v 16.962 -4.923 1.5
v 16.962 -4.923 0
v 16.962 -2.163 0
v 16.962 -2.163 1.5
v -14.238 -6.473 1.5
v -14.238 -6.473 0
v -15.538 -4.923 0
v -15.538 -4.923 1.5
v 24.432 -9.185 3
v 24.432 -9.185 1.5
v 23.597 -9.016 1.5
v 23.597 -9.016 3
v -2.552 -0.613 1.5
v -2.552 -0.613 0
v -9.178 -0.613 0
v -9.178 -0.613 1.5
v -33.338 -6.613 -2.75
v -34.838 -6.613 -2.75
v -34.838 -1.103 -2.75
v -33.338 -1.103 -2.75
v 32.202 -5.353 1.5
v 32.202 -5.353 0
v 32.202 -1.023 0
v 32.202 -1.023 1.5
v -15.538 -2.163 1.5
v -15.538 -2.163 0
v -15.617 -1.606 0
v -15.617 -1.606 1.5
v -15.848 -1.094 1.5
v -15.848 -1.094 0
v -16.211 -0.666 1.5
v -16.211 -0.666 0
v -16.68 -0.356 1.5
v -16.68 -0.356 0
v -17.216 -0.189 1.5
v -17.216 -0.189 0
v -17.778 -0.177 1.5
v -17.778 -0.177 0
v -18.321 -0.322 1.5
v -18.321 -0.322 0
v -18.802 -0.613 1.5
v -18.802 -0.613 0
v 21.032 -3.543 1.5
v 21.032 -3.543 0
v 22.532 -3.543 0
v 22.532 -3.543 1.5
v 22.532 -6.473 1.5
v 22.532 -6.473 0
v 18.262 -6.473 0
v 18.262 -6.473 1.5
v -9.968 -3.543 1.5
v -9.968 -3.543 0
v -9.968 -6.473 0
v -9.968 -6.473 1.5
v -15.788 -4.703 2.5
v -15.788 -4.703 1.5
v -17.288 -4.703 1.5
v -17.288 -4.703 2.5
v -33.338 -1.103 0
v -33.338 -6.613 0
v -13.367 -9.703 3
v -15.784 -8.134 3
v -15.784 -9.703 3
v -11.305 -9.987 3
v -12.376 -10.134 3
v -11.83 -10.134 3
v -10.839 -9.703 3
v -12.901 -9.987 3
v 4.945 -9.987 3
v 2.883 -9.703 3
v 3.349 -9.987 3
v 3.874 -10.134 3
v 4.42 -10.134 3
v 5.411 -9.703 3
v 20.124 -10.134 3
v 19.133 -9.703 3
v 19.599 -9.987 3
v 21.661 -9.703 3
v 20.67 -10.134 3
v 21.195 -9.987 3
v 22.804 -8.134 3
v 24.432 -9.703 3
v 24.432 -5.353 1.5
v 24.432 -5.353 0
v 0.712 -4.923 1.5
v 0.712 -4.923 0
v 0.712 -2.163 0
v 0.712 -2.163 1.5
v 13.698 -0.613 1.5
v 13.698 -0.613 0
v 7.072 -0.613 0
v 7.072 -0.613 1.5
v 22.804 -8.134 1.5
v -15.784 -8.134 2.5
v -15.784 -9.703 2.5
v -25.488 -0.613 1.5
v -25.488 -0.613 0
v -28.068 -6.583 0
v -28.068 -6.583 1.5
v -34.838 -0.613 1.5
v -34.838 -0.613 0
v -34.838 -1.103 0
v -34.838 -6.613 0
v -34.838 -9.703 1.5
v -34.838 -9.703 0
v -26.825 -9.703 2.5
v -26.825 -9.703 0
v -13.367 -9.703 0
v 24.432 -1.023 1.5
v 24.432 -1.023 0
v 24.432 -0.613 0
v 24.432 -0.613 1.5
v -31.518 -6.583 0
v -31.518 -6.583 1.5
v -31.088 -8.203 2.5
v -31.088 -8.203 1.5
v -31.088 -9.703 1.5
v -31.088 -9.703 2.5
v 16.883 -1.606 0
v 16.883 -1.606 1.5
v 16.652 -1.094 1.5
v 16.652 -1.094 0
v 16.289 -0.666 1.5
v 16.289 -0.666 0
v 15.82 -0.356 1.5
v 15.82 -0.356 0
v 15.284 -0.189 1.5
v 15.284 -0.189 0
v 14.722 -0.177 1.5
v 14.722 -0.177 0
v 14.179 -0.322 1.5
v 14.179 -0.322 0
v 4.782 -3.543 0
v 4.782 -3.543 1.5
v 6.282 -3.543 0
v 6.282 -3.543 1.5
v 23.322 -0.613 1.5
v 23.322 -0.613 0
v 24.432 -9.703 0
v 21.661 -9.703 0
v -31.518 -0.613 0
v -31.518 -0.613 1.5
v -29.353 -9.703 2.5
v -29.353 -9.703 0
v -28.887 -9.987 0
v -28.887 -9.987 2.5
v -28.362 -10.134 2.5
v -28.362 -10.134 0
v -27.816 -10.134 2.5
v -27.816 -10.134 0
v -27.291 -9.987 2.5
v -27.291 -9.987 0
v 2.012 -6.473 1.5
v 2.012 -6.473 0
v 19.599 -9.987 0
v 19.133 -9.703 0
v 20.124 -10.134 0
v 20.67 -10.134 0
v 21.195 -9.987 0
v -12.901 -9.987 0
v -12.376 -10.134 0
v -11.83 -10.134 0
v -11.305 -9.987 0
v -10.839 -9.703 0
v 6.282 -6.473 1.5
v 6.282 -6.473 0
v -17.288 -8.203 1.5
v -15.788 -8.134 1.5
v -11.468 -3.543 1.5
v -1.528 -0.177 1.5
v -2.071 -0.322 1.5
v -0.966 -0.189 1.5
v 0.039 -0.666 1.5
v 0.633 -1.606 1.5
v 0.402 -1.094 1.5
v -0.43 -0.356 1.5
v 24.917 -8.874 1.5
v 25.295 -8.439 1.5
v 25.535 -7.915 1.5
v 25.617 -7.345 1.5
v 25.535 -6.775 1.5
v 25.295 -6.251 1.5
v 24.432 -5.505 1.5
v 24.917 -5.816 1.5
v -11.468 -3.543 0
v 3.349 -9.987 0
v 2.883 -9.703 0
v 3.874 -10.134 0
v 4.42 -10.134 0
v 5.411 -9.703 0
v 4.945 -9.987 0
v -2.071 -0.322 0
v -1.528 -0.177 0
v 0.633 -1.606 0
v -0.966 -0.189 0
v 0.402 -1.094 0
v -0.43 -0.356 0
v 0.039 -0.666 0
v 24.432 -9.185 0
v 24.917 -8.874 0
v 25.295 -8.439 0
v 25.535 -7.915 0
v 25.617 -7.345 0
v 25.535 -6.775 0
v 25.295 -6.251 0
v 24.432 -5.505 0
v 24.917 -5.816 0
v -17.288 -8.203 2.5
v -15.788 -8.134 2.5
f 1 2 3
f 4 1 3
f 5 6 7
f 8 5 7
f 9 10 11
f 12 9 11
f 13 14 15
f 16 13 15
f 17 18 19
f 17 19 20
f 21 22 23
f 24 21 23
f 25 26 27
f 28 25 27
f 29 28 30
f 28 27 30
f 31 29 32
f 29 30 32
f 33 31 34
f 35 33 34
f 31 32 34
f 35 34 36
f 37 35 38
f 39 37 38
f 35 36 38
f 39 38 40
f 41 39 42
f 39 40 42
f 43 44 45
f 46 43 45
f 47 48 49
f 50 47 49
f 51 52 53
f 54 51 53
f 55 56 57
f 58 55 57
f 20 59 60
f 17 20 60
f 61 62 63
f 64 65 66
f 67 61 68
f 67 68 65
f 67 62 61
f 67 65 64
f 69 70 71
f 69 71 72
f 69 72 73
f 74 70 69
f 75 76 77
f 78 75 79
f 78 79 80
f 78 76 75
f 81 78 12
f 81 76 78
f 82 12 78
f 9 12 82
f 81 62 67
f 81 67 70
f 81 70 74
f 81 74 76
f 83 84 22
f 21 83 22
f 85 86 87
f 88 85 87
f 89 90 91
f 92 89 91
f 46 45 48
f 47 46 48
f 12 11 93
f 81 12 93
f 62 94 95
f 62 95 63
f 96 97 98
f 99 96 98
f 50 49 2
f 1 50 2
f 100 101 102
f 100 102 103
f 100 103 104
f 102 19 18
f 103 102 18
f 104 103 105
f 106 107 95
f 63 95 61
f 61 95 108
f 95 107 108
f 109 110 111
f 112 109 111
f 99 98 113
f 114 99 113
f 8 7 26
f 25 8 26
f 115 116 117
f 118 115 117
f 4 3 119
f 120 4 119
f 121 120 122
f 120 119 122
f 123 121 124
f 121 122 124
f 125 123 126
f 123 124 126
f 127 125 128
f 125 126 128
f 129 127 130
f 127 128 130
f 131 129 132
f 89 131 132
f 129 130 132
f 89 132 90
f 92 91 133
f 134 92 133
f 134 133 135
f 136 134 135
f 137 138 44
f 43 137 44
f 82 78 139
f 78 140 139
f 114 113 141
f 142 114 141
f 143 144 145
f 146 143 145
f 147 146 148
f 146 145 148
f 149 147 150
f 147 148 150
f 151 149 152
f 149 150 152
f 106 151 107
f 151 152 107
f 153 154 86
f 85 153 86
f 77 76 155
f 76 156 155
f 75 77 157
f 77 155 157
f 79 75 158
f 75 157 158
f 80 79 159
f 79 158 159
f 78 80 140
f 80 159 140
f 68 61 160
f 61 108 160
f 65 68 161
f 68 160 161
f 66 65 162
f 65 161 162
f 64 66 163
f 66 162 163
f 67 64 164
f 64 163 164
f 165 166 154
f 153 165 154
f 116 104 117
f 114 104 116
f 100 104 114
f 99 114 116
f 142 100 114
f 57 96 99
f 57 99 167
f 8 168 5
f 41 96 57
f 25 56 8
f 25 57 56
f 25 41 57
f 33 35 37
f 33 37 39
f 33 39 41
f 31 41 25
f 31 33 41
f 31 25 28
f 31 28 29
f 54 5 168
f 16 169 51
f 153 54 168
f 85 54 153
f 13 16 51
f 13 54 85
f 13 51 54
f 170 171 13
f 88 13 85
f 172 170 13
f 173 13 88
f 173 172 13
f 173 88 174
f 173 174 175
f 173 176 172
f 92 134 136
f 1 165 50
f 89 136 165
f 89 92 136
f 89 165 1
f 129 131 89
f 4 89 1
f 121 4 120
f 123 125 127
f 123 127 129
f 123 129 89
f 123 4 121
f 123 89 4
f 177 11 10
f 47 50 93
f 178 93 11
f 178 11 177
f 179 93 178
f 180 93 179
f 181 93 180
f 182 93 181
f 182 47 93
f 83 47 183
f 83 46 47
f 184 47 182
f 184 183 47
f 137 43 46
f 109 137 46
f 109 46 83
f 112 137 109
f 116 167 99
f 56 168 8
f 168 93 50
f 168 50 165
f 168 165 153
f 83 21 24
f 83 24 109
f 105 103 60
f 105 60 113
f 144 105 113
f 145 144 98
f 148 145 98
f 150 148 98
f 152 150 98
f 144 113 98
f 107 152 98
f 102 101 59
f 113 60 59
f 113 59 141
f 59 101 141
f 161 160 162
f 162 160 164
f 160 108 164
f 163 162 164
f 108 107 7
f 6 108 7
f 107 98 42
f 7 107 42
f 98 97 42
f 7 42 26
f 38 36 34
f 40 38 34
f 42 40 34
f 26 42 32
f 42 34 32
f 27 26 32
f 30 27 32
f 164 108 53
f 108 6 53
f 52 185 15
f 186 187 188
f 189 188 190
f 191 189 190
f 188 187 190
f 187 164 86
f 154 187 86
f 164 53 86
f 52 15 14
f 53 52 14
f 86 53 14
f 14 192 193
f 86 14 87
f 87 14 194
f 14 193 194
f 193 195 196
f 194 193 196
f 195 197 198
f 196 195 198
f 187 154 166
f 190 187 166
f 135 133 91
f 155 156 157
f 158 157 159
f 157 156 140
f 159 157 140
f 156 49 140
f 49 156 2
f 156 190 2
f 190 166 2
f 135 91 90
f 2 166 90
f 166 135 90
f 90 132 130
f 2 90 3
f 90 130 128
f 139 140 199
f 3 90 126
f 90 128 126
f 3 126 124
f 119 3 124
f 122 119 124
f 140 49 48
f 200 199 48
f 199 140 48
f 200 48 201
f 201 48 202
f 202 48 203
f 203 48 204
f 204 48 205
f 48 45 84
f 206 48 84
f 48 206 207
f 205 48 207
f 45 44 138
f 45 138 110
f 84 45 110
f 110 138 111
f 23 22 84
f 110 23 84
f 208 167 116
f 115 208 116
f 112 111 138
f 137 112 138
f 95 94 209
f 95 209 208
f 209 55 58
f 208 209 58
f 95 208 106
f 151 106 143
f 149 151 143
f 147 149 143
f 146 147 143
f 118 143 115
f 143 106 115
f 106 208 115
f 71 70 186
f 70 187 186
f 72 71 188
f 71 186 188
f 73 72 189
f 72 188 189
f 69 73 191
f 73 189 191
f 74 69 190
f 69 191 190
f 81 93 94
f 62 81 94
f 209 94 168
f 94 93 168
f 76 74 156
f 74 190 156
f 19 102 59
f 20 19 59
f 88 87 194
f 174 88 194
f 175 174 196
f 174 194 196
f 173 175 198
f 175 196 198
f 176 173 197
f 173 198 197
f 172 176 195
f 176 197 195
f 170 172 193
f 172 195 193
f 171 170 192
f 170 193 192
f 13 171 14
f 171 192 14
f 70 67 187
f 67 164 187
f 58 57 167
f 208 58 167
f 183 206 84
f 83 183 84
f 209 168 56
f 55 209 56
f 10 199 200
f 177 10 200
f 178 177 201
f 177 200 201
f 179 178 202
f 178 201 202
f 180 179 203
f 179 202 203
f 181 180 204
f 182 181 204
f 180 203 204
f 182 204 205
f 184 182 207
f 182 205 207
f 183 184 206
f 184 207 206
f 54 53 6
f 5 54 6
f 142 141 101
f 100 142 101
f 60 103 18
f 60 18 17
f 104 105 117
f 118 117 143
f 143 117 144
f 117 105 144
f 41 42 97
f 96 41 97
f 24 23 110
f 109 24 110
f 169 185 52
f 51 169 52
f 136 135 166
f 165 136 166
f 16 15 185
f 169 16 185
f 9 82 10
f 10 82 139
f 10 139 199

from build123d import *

# Parameters (mm, degrees)
F1_DEPTH = 1.5
F3_DEPTH = 1.5
F4_W     = 15.3044191209
F4_H     = 0.5
F5_DEPTH = 12.5
F6_W     = 1.5
F6_H     = 5.51
F7_DEPTH = 2.75


with BuildPart() as f1:
    # F0 (on Top) → F1 (new body)
    with BuildSketch(Plane.XY):
        with BuildLine():
            Line((-31.5180477679, -0.6126557182), (-34.8380477679, -0.6126557182))
            Line((-34.8380477679, -0.6126557182), (-34.8380477679, -9.7026557182))
            Line((-34.8380477679, -9.7026557182), (-29.3529247474, -9.7026557182))
            ThreePointArc((-29.3529247474, -9.7026557182), (-28.0890022814, -10.1526557182), (-26.8250798155, -9.7026557182))
            Line((-26.8250798155, -9.7026557182), (-13.3669702339, -9.7026557182))
            ThreePointArc((-13.3669702339, -9.7026557182), (-12.1030477679, -10.1526557182), (-10.8391253019, -9.7026557182))
            Line((-10.8391253019, -9.7026557182), (2.8830297661, -9.7026557182))
            ThreePointArc((2.8830297661, -9.7026557182), (4.1469522321, -10.1526557182), (5.4108746981, -9.7026557182))
            Line((5.4108746981, -9.7026557182), (19.1330297661, -9.7026557182))
            ThreePointArc((19.1330297661, -9.7026557182), (20.3969522321, -10.1526557182), (21.6608746981, -9.7026557182))
            Line((21.6608746981, -9.7026557182), (24.4319522321, -9.7026557182))
            Line((24.4319522321, -9.7026557182), (24.4319522321, -9.1846820578))
            ThreePointArc((24.4319522321, -9.1846820578), (25.6169859572, -7.3449714109), (24.4319522321, -5.5052607641))
            Line((24.4319522321, -5.5052607641), (24.4319522321, -5.3526557182))
            Line((24.4319522321, -5.3526557182), (32.2019522321, -5.3526557182))
            Line((32.2019522321, -5.3526557182), (32.2019522321, -1.0226557182))
            Line((32.2019522321, -1.0226557182), (24.4319522321, -1.0226557182))
            Line((24.4319522321, -1.0226557182), (24.4319522321, -0.6126557182))
            Line((24.4319522321, -0.6126557182), (23.3219522321, -0.6126557182))
            Line((23.3219522321, -0.6126557182), (21.0319522321, -3.5426557182))
            Line((21.0319522321, -3.5426557182), (22.5319522321, -3.5426557182))
            Line((22.5319522321, -3.5426557182), (22.5319522321, -6.4726557182))
            Line((22.5319522321, -6.4726557182), (18.2619522321, -6.4726557182))
            Line((18.2619522321, -6.4726557182), (16.9619522321, -4.9226557182))
            Line((16.9619522321, -4.9226557182), (16.9619522321, -2.1626557182))
            ThreePointArc((16.9619522321, -2.1626557182), (15.8199018425, -0.3560228098), (13.6980297661, -0.6126557182))
            Line((13.6980297661, -0.6126557182), (7.0719522321, -0.6126557182))
            Line((7.0719522321, -0.6126557182), (4.7819522321, -3.5426557182))
            Line((4.7819522321, -3.5426557182), (6.2819522321, -3.5426557182))
            Line((6.2819522321, -3.5426557182), (6.2819522321, -6.4726557182))
            Line((6.2819522321, -6.4726557182), (2.0119522321, -6.4726557182))
            Line((2.0119522321, -6.4726557182), (0.7119522321, -4.9226557182))
            Line((0.7119522321, -4.9226557182), (0.7119522321, -2.1626557182))
            ThreePointArc((0.7119522321, -2.1626557182), (-0.4300981575, -0.3560228098), (-2.5519702339, -0.6126557182))
            Line((-2.5519702339, -0.6126557182), (-9.1780477679, -0.6126557182))
            Line((-9.1780477679, -0.6126557182), (-11.4680477679, -3.5426557182))
            Line((-11.4680477679, -3.5426557182), (-9.9680477679, -3.5426557182))
            Line((-9.9680477679, -3.5426557182), (-9.9680477679, -6.4726557182))
            Line((-9.9680477679, -6.4726557182), (-14.2380477679, -6.4726557182))
            Line((-14.2380477679, -6.4726557182), (-15.5380477679, -4.9226557182))
            Line((-15.5380477679, -4.9226557182), (-15.5380477679, -2.1626557182))
            ThreePointArc((-15.5380477679, -2.1626557182), (-16.6800981575, -0.3560228098), (-18.8019702339, -0.6126557182))
            Line((-18.8019702339, -0.6126557182), (-25.4880477679, -0.6126557182))
            Line((-25.4880477679, -0.6126557182), (-28.0680477679, -6.5826557182))
            Line((-28.0680477679, -6.5826557182), (-31.5180477679, -6.5826557182))
            Line((-31.5180477679, -6.5826557182), (-31.5180477679, -0.6126557182))
        make_face()
    extrude(amount=F1_DEPTH)

    # F2 (on face) → F3 (join)
    with BuildSketch(Plane.XY.offset(1.5)):
        with BuildLine():
            Line((-31.0880477679, -8.2026557182), (-31.0880477679, -9.7026557182))
            Line((-31.0880477679, -9.7026557182), (-29.3529247474, -9.7026557182))
            ThreePointArc((-29.3529247474, -9.7026557182), (-28.0890022814, -10.1526557182), (-26.8250798155, -9.7026557182))
            Line((-26.8250798155, -9.7026557182), (-13.3669702339, -9.7026557182))
            ThreePointArc((-13.3669702339, -9.7026557182), (-12.1030477679, -10.1526557182), (-10.8391253019, -9.7026557182))
            Line((-10.8391253019, -9.7026557182), (2.8830297661, -9.7026557182))
            ThreePointArc((2.8830297661, -9.7026557182), (4.1469522321, -10.1526557182), (5.4108746981, -9.7026557182))
            Line((5.4108746981, -9.7026557182), (19.1330297661, -9.7026557182))
            ThreePointArc((19.1330297661, -9.7026557182), (20.3969522321, -10.1526557182), (21.6608746981, -9.7026557182))
            Line((21.6608746981, -9.7026557182), (24.4319522321, -9.7026557182))
            Line((24.4319522321, -9.7026557182), (24.4319522321, -9.1846820578))
            Line((24.4319522321, -9.1846820578), (23.5973913223, -9.0155852959))
            Line((23.5973913223, -9.0155852959), (22.8039156646, -8.1339450553))
            Line((22.8039156646, -8.1339450553), (-15.7880477679, -8.1339450553))
            Line((-15.7880477679, -8.1339450553), (-15.7880477679, -4.7026557182))
            Line((-15.7880477679, -4.7026557182), (-17.2880477679, -4.7026557182))
            Line((-17.2880477679, -4.7026557182), (-17.2880477679, -8.2026557182))
            Line((-17.2880477679, -8.2026557182), (-31.0880477679, -8.2026557182))
        make_face()
    extrude(amount=F3_DEPTH)

    # F4 (on face) → F5 (cut, symmetric)
    with BuildSketch(Plane(origin=(0, -8.2026557182, 0), x_dir=(-1, 0, 0), z_dir=(0, 1, 0))):
        with Locations((23.4358382075, 2.75)):
            Rectangle(F4_W, F4_H)
    extrude(amount=F5_DEPTH, both=True, mode=Mode.SUBTRACT)

    # F6 (on face) → F7 (join)
    with BuildSketch(Plane(origin=(0, 0, 0), x_dir=(1, 0, 0), z_dir=(0, 0, -1))):
        with Locations((-34.0880477679, 3.8576557182)):
            Rectangle(F6_W, F6_H)
    extrude(amount=F7_DEPTH)


solid = f1.part
